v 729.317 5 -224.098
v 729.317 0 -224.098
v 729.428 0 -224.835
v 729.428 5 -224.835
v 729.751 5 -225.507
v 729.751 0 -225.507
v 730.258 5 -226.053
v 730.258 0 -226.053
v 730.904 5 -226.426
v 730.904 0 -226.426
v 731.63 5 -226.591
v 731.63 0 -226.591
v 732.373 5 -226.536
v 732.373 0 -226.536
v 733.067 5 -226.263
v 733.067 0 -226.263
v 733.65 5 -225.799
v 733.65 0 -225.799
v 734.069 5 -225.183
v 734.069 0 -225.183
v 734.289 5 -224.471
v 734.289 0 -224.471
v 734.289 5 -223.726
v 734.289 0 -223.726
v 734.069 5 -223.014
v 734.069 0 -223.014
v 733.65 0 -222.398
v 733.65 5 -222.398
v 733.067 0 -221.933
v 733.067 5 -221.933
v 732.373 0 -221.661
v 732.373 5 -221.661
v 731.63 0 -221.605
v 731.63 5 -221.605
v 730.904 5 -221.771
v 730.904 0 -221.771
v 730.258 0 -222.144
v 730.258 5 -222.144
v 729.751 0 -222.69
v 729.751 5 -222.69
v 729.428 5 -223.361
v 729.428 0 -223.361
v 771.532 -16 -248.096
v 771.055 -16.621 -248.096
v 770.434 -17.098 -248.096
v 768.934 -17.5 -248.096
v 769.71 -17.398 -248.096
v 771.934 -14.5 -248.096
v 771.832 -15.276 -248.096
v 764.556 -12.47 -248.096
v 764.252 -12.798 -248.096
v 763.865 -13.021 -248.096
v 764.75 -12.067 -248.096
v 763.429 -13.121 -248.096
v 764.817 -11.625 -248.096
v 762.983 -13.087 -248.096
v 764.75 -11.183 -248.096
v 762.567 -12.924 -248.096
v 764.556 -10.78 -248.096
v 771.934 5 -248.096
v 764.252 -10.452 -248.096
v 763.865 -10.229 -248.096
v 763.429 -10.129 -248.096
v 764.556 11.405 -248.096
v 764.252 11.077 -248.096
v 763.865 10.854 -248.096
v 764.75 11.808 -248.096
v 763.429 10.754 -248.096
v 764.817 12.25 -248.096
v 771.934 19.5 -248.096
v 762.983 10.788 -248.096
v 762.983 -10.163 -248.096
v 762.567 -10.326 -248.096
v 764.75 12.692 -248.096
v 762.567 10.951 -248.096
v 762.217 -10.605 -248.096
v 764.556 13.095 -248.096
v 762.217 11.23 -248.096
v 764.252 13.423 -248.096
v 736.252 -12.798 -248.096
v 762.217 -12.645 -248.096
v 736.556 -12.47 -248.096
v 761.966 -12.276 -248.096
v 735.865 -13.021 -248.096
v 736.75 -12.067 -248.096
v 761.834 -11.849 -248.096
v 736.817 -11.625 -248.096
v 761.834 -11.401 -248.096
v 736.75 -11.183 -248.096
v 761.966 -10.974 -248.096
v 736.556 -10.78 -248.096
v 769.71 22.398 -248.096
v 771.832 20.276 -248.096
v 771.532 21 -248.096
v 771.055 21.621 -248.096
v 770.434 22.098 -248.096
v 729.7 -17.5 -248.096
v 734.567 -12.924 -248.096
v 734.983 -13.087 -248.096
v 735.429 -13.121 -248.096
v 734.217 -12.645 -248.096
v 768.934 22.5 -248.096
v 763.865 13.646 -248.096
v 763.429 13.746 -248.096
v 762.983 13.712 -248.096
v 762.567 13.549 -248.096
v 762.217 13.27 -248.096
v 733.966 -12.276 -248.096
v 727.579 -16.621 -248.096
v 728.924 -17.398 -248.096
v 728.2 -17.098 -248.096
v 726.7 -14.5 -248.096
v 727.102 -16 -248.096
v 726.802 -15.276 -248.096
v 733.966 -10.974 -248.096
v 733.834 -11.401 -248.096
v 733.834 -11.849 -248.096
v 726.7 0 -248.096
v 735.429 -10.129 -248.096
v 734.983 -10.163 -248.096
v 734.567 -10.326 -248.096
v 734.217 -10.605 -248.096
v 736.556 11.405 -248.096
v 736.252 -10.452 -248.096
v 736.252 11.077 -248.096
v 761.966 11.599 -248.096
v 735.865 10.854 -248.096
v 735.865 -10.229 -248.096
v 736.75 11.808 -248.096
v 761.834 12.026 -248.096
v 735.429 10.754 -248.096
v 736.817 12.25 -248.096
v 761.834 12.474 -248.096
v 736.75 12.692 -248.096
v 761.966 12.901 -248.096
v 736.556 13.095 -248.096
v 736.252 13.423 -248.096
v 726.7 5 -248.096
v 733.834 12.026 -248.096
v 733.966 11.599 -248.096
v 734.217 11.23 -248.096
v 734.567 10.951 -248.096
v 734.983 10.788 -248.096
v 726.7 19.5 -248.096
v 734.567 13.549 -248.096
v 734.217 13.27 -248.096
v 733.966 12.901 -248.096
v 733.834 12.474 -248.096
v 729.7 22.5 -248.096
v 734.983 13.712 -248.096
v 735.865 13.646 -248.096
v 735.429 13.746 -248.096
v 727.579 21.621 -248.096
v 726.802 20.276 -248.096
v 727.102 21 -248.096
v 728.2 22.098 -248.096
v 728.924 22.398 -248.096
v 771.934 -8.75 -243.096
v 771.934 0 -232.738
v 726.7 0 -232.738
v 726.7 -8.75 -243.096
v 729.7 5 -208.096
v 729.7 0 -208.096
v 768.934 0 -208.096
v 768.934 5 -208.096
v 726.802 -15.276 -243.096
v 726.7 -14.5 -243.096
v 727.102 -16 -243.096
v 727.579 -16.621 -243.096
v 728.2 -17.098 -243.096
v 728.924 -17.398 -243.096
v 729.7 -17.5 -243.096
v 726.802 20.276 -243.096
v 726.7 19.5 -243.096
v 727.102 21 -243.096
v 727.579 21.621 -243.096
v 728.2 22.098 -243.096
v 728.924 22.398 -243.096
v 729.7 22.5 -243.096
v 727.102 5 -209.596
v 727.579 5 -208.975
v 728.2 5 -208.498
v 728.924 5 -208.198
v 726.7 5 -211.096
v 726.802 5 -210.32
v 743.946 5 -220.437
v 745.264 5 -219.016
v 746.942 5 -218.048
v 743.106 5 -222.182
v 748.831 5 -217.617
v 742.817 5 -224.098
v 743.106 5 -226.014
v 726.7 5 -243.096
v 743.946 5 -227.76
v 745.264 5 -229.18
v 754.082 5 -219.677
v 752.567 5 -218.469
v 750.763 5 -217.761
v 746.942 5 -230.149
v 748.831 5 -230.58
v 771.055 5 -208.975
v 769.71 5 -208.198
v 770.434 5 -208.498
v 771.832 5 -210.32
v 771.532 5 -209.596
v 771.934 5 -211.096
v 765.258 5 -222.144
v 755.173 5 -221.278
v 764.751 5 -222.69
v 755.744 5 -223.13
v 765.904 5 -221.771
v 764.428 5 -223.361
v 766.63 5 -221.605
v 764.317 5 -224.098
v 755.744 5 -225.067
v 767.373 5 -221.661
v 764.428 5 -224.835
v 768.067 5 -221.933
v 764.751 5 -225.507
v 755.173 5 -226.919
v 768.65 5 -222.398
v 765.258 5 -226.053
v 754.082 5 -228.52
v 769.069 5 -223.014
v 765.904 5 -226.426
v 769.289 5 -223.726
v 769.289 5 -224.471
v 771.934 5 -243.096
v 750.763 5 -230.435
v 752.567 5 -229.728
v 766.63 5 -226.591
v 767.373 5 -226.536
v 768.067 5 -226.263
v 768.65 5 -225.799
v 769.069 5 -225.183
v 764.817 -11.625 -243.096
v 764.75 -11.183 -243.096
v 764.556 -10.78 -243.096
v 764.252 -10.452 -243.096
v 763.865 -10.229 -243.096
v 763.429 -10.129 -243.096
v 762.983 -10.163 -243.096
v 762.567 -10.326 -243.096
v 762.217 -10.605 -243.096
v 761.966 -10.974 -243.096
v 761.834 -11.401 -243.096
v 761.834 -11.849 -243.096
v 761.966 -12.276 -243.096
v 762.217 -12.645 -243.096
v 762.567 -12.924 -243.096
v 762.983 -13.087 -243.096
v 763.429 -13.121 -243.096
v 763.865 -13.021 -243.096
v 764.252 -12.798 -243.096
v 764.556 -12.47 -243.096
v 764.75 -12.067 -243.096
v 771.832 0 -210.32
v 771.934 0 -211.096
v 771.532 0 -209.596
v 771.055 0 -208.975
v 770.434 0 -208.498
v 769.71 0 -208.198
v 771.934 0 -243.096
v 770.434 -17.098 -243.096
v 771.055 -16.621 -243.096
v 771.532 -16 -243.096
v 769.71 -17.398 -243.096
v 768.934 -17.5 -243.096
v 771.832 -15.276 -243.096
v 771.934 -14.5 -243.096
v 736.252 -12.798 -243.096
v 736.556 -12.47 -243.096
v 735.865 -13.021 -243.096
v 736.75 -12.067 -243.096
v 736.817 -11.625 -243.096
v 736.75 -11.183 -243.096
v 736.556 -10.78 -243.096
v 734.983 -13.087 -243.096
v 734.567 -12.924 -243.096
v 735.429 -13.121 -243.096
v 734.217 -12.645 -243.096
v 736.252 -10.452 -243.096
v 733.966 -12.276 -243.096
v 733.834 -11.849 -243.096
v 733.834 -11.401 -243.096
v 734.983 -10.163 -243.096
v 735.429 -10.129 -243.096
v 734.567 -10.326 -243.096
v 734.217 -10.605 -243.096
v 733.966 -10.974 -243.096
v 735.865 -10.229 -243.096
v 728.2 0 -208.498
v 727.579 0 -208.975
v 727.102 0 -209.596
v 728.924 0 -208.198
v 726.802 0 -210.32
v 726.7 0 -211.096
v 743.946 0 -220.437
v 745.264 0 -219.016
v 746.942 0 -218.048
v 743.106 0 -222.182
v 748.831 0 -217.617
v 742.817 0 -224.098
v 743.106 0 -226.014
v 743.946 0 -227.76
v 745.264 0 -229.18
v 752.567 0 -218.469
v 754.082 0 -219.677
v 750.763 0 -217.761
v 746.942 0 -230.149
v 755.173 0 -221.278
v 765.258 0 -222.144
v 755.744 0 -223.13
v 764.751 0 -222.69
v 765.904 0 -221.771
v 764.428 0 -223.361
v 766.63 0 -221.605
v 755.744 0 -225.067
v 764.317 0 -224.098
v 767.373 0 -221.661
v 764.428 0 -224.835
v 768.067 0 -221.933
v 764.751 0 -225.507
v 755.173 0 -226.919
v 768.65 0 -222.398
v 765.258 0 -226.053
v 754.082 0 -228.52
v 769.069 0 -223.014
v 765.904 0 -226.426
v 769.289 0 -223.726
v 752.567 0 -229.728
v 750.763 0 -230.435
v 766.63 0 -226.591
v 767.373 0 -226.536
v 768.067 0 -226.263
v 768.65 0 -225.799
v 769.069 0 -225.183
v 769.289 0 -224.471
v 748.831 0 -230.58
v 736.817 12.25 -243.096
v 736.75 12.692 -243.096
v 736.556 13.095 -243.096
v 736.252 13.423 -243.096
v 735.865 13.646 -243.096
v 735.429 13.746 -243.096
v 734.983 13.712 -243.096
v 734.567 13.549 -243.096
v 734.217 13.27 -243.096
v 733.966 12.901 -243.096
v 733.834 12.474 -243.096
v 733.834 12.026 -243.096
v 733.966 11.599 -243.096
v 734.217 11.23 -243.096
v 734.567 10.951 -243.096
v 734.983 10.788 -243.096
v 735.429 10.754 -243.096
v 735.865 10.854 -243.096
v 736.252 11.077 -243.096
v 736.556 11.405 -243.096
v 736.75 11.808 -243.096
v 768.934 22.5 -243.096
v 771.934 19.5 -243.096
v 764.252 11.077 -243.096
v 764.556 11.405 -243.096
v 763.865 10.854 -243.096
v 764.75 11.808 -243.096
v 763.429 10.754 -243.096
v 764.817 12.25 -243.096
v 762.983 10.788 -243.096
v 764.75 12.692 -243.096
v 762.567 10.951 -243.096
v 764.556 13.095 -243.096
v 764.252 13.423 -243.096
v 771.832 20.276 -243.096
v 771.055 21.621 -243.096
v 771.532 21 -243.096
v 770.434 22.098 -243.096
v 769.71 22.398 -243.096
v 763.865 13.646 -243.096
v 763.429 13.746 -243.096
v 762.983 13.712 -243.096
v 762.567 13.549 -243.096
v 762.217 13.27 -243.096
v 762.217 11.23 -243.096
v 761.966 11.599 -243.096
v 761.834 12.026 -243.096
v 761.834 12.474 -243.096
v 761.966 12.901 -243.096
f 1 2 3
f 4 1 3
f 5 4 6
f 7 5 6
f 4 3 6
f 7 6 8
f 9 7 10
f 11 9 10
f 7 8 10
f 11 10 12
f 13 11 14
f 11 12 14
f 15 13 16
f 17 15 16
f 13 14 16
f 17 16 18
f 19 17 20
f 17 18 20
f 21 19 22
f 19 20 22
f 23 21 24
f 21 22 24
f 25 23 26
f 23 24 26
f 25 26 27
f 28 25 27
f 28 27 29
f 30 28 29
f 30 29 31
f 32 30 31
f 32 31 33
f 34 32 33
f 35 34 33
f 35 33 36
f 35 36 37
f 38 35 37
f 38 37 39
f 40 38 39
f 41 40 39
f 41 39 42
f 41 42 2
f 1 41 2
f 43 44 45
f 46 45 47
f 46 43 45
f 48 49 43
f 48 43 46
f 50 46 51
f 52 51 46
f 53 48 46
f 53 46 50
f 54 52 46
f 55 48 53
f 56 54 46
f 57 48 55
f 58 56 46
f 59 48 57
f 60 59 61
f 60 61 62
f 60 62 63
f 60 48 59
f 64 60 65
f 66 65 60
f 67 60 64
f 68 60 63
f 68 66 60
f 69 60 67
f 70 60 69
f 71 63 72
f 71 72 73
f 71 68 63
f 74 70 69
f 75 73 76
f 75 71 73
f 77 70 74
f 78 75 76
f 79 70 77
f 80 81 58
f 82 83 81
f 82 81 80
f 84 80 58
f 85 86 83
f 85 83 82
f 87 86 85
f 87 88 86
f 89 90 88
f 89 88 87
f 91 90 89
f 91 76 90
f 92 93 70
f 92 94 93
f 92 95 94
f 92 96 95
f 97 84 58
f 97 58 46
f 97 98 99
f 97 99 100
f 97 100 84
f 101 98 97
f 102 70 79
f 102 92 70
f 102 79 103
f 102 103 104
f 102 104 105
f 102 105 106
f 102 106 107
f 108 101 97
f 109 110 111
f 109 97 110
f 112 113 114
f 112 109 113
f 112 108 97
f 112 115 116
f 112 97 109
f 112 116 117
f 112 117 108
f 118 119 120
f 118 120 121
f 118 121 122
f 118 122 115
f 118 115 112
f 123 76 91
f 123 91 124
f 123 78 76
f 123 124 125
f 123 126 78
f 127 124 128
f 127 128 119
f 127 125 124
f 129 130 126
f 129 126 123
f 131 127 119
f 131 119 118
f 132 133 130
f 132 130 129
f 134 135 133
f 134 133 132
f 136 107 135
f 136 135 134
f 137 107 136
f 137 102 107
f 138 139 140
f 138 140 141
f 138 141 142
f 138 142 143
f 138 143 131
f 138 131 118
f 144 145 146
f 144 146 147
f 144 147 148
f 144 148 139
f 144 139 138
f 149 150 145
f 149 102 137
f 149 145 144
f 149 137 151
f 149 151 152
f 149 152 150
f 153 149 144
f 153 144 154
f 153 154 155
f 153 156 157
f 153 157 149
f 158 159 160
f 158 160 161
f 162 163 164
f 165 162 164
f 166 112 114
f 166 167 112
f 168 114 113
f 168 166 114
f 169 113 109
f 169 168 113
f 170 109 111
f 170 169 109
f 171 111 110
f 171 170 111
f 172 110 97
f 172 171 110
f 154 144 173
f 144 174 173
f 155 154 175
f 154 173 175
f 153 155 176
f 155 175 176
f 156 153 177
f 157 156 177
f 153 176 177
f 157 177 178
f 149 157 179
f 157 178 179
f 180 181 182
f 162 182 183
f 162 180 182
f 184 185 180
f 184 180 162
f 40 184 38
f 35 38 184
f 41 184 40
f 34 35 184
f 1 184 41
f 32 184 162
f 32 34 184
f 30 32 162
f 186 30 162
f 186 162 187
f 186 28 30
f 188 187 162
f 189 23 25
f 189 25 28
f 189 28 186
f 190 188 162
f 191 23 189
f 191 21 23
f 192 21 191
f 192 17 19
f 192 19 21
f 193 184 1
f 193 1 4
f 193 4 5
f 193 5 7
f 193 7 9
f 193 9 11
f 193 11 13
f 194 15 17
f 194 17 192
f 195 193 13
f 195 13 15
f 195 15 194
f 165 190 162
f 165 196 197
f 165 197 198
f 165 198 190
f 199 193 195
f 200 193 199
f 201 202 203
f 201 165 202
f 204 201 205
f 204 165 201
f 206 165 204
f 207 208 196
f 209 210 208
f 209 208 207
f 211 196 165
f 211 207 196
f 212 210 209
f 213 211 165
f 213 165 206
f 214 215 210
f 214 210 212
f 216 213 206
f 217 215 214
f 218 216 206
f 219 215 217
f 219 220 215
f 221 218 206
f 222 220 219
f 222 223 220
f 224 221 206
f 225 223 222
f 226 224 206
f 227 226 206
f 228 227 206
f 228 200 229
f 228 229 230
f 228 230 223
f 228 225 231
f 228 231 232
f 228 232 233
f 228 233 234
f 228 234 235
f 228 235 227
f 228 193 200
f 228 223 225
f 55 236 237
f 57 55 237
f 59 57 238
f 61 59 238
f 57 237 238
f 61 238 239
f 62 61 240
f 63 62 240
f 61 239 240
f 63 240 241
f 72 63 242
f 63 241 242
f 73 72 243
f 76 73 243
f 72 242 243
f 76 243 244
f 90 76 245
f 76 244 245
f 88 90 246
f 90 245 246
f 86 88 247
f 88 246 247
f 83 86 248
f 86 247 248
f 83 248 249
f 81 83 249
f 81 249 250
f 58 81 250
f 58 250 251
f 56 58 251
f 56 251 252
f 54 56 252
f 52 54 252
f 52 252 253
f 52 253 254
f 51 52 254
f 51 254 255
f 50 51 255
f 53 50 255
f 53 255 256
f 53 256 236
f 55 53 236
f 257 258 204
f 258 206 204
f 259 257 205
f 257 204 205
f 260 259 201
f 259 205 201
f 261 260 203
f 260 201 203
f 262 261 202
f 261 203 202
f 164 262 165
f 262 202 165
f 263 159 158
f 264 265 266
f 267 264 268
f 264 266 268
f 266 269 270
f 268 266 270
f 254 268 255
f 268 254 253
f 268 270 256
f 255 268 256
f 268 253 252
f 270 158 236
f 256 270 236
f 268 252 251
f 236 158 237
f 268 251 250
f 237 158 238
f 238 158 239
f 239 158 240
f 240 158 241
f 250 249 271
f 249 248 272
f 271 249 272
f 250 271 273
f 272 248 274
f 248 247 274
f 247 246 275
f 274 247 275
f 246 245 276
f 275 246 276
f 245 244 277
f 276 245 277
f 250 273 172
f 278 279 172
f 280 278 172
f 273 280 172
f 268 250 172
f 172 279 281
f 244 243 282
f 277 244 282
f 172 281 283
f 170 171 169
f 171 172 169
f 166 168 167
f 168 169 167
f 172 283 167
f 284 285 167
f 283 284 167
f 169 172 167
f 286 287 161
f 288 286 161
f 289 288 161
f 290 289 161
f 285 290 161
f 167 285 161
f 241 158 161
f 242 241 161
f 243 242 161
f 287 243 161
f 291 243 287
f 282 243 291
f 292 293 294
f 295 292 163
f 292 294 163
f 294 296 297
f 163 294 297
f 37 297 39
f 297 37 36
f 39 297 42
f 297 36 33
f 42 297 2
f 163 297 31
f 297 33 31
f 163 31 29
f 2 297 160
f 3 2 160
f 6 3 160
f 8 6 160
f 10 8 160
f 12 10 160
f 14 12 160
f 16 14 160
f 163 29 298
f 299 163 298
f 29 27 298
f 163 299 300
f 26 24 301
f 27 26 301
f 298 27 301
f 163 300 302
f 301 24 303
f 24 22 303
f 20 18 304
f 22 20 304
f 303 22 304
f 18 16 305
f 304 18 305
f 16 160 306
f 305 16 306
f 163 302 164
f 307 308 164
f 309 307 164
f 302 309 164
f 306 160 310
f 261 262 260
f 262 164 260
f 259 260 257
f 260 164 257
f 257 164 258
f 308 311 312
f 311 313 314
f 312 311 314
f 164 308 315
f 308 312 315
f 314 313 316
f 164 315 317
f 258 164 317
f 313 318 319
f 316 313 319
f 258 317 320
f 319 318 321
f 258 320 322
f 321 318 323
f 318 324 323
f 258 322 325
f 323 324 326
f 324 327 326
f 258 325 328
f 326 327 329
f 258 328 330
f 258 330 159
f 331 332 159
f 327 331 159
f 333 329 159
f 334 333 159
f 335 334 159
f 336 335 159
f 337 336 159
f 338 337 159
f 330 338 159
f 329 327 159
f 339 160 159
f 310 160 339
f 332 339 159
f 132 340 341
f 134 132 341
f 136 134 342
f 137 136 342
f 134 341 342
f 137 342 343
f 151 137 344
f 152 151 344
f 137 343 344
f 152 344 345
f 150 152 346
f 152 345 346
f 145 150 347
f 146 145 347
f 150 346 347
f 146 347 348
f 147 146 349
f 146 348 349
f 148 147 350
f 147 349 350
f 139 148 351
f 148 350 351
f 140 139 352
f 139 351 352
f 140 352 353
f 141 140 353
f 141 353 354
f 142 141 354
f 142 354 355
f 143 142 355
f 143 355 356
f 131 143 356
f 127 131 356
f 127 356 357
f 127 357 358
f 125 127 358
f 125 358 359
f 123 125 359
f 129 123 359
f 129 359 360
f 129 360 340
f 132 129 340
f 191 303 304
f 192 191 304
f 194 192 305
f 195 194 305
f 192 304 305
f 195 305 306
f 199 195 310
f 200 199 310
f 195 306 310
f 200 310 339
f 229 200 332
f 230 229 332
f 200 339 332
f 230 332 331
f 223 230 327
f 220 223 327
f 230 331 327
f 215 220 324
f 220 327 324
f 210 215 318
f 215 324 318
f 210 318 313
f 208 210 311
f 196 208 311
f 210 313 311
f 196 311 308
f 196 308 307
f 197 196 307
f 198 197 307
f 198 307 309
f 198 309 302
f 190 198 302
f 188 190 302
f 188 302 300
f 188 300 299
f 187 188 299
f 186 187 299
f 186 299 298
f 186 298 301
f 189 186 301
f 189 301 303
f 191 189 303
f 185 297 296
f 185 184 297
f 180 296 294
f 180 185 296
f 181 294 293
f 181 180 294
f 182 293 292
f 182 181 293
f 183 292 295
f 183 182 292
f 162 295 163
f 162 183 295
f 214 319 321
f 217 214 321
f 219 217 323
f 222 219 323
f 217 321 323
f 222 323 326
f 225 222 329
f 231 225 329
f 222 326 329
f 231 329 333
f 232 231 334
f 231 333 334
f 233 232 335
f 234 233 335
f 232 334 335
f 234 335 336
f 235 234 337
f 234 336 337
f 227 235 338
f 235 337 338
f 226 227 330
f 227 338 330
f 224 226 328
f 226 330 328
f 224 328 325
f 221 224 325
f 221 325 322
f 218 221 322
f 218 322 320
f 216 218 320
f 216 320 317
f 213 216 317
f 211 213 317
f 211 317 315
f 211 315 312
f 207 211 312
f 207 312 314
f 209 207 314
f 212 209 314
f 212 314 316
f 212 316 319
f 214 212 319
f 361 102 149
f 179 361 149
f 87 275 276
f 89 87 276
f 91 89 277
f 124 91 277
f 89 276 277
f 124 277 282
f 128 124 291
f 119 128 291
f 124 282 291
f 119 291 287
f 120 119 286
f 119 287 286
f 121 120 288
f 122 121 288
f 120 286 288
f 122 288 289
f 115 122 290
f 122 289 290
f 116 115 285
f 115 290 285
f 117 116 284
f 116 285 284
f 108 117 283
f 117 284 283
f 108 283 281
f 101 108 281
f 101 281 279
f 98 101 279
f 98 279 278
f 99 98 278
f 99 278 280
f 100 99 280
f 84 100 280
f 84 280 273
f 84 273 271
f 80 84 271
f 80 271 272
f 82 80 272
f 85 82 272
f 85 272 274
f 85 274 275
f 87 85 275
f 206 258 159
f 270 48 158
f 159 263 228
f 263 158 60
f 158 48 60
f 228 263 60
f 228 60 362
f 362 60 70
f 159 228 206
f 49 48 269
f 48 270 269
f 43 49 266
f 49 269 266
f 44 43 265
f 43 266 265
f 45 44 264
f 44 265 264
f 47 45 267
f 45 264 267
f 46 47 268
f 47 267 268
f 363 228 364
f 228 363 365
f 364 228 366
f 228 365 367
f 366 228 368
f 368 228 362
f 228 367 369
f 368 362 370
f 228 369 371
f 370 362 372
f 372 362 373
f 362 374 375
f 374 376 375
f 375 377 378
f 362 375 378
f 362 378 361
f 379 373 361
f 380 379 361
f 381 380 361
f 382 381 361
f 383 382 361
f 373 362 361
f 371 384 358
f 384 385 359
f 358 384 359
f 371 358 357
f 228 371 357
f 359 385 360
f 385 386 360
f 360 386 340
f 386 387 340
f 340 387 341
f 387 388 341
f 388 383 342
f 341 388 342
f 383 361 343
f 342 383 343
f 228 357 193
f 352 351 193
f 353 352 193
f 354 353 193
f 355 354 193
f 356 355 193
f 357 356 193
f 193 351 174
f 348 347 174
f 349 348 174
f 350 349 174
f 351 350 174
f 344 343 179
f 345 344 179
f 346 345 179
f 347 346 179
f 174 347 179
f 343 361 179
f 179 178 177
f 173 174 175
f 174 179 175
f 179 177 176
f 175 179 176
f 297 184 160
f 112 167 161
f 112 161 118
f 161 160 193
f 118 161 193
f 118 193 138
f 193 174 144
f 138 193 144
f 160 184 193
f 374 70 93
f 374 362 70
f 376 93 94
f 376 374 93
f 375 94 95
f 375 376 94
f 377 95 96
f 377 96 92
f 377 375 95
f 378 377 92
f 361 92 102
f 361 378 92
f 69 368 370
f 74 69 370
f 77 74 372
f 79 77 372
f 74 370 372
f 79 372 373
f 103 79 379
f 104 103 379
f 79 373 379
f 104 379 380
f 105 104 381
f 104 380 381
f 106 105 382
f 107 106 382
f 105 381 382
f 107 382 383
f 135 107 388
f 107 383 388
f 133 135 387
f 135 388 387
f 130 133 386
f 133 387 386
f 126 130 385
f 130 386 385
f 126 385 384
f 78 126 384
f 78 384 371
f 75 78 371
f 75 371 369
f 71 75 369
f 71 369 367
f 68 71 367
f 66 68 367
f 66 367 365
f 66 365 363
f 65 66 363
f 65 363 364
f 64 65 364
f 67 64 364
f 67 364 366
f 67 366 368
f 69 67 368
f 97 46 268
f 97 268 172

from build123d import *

# Parameters (mm, degrees)
SKETCH_1_W          = 45.233636601
SKETCH_1_H          = 40
EXTRUDE_1_DEPTH     = 5
SKETCH_2_R          = 2.5
SKETCH_2_R_2        = 6.5
CUT_EXTRUDE_1_DEPTH = 6
SKETCH_3_W          = 45.2336366
SKETCH_3_H          = 40
EXTRUDE_2_DEPTH     = 5
EXTRUDE_3_DEPTH     = 45.233637
FILLET_1_R          = 3
FILLET_3_R          = 3
SKETCH_5_R          = 1.5
CUT_EXTRUDE_2_DEPTH = 6


with BuildPart() as part:
    # 草图1 → 凸台-拉伸1 (new body)
    with BuildSketch(Plane(origin=(-84.851927107, 0, -36.561705941), x_dir=(1, 0, 0), z_dir=(0, 1, 0))):
        with Locations((834.168962127, 191.534282172)):
            Rectangle(SKETCH_1_W, SKETCH_1_H)
    extrude(amount=EXTRUDE_1_DEPTH)

    # 草图2 → 切除-拉伸1 (cut, through all)
    with BuildSketch(Plane(origin=(0, 0, 0), x_dir=(-1, 0, 0), z_dir=(0, -1, 0))):
        with Locations((-766.81703502, 224.098378246)):
            Circle(SKETCH_2_R)
        with Locations((-731.81703502, 224.098378246)):
            Circle(SKETCH_2_R)
        with Locations((-749.31703502, 224.098378246)):
            Circle(SKETCH_2_R_2)
    extrude(amount=-CUT_EXTRUDE_1_DEPTH, mode=Mode.SUBTRACT)

    # 草图3 → 凸台-拉伸2 (add)
    with BuildSketch(Plane(origin=(0, 0, -248.095988113), x_dir=(-1, 0, 0), z_dir=(0, 0, -1))):
        with Locations((-749.31703502, 2.5)):
            Rectangle(SKETCH_3_W, SKETCH_3_H)
    extrude(amount=-EXTRUDE_2_DEPTH)

    # 草图4 → 凸台-拉伸3 (add)
    with BuildSketch(Plane.ZY.offset(-726.70021672)):
        Polygon((-232.73834126, 0), (-243.095988113, -8.75), (-243.095988113, 0), align=None)
    extrude(amount=-EXTRUDE_3_DEPTH)

    # 圆角1
    fillet_1_edges = [part.edges().sort_by_distance(p)[0] for p in [
        (771.93385332, 2.5, -208.095988113),
        (726.70021672, 2.5, -208.095988113),
    ]]
    fillet(fillet_1_edges, radius=FILLET_1_R)

    # 圆角3
    fillet_3_edges = [part.edges().sort_by_distance(p)[0] for p in [
        (726.70021672, 22.5, -245.595988113),
        (771.93385332, -17.5, -245.595988113),
        (771.93385332, 22.5, -245.595988113),
        (726.70021672, -17.5, -245.595988113),
    ]]
    fillet(fillet_3_edges, radius=FILLET_3_R)

    # 草图5 → 切除-拉伸2 (cut, through all)
    with BuildSketch(Plane.XY.offset(-243.095988113)):
        with Locations((763.31703502, 12.25)):
            Circle(SKETCH_5_R)
        with Locations((763.31703502, -11.625)):
            Circle(SKETCH_5_R)
        with Locations((735.31703502, -11.625)):
            Circle(SKETCH_5_R)
        with Locations((735.31703502, 12.25)):
            Circle(SKETCH_5_R)
    extrude(amount=-CUT_EXTRUDE_2_DEPTH, mode=Mode.SUBTRACT)


solid = part.part
